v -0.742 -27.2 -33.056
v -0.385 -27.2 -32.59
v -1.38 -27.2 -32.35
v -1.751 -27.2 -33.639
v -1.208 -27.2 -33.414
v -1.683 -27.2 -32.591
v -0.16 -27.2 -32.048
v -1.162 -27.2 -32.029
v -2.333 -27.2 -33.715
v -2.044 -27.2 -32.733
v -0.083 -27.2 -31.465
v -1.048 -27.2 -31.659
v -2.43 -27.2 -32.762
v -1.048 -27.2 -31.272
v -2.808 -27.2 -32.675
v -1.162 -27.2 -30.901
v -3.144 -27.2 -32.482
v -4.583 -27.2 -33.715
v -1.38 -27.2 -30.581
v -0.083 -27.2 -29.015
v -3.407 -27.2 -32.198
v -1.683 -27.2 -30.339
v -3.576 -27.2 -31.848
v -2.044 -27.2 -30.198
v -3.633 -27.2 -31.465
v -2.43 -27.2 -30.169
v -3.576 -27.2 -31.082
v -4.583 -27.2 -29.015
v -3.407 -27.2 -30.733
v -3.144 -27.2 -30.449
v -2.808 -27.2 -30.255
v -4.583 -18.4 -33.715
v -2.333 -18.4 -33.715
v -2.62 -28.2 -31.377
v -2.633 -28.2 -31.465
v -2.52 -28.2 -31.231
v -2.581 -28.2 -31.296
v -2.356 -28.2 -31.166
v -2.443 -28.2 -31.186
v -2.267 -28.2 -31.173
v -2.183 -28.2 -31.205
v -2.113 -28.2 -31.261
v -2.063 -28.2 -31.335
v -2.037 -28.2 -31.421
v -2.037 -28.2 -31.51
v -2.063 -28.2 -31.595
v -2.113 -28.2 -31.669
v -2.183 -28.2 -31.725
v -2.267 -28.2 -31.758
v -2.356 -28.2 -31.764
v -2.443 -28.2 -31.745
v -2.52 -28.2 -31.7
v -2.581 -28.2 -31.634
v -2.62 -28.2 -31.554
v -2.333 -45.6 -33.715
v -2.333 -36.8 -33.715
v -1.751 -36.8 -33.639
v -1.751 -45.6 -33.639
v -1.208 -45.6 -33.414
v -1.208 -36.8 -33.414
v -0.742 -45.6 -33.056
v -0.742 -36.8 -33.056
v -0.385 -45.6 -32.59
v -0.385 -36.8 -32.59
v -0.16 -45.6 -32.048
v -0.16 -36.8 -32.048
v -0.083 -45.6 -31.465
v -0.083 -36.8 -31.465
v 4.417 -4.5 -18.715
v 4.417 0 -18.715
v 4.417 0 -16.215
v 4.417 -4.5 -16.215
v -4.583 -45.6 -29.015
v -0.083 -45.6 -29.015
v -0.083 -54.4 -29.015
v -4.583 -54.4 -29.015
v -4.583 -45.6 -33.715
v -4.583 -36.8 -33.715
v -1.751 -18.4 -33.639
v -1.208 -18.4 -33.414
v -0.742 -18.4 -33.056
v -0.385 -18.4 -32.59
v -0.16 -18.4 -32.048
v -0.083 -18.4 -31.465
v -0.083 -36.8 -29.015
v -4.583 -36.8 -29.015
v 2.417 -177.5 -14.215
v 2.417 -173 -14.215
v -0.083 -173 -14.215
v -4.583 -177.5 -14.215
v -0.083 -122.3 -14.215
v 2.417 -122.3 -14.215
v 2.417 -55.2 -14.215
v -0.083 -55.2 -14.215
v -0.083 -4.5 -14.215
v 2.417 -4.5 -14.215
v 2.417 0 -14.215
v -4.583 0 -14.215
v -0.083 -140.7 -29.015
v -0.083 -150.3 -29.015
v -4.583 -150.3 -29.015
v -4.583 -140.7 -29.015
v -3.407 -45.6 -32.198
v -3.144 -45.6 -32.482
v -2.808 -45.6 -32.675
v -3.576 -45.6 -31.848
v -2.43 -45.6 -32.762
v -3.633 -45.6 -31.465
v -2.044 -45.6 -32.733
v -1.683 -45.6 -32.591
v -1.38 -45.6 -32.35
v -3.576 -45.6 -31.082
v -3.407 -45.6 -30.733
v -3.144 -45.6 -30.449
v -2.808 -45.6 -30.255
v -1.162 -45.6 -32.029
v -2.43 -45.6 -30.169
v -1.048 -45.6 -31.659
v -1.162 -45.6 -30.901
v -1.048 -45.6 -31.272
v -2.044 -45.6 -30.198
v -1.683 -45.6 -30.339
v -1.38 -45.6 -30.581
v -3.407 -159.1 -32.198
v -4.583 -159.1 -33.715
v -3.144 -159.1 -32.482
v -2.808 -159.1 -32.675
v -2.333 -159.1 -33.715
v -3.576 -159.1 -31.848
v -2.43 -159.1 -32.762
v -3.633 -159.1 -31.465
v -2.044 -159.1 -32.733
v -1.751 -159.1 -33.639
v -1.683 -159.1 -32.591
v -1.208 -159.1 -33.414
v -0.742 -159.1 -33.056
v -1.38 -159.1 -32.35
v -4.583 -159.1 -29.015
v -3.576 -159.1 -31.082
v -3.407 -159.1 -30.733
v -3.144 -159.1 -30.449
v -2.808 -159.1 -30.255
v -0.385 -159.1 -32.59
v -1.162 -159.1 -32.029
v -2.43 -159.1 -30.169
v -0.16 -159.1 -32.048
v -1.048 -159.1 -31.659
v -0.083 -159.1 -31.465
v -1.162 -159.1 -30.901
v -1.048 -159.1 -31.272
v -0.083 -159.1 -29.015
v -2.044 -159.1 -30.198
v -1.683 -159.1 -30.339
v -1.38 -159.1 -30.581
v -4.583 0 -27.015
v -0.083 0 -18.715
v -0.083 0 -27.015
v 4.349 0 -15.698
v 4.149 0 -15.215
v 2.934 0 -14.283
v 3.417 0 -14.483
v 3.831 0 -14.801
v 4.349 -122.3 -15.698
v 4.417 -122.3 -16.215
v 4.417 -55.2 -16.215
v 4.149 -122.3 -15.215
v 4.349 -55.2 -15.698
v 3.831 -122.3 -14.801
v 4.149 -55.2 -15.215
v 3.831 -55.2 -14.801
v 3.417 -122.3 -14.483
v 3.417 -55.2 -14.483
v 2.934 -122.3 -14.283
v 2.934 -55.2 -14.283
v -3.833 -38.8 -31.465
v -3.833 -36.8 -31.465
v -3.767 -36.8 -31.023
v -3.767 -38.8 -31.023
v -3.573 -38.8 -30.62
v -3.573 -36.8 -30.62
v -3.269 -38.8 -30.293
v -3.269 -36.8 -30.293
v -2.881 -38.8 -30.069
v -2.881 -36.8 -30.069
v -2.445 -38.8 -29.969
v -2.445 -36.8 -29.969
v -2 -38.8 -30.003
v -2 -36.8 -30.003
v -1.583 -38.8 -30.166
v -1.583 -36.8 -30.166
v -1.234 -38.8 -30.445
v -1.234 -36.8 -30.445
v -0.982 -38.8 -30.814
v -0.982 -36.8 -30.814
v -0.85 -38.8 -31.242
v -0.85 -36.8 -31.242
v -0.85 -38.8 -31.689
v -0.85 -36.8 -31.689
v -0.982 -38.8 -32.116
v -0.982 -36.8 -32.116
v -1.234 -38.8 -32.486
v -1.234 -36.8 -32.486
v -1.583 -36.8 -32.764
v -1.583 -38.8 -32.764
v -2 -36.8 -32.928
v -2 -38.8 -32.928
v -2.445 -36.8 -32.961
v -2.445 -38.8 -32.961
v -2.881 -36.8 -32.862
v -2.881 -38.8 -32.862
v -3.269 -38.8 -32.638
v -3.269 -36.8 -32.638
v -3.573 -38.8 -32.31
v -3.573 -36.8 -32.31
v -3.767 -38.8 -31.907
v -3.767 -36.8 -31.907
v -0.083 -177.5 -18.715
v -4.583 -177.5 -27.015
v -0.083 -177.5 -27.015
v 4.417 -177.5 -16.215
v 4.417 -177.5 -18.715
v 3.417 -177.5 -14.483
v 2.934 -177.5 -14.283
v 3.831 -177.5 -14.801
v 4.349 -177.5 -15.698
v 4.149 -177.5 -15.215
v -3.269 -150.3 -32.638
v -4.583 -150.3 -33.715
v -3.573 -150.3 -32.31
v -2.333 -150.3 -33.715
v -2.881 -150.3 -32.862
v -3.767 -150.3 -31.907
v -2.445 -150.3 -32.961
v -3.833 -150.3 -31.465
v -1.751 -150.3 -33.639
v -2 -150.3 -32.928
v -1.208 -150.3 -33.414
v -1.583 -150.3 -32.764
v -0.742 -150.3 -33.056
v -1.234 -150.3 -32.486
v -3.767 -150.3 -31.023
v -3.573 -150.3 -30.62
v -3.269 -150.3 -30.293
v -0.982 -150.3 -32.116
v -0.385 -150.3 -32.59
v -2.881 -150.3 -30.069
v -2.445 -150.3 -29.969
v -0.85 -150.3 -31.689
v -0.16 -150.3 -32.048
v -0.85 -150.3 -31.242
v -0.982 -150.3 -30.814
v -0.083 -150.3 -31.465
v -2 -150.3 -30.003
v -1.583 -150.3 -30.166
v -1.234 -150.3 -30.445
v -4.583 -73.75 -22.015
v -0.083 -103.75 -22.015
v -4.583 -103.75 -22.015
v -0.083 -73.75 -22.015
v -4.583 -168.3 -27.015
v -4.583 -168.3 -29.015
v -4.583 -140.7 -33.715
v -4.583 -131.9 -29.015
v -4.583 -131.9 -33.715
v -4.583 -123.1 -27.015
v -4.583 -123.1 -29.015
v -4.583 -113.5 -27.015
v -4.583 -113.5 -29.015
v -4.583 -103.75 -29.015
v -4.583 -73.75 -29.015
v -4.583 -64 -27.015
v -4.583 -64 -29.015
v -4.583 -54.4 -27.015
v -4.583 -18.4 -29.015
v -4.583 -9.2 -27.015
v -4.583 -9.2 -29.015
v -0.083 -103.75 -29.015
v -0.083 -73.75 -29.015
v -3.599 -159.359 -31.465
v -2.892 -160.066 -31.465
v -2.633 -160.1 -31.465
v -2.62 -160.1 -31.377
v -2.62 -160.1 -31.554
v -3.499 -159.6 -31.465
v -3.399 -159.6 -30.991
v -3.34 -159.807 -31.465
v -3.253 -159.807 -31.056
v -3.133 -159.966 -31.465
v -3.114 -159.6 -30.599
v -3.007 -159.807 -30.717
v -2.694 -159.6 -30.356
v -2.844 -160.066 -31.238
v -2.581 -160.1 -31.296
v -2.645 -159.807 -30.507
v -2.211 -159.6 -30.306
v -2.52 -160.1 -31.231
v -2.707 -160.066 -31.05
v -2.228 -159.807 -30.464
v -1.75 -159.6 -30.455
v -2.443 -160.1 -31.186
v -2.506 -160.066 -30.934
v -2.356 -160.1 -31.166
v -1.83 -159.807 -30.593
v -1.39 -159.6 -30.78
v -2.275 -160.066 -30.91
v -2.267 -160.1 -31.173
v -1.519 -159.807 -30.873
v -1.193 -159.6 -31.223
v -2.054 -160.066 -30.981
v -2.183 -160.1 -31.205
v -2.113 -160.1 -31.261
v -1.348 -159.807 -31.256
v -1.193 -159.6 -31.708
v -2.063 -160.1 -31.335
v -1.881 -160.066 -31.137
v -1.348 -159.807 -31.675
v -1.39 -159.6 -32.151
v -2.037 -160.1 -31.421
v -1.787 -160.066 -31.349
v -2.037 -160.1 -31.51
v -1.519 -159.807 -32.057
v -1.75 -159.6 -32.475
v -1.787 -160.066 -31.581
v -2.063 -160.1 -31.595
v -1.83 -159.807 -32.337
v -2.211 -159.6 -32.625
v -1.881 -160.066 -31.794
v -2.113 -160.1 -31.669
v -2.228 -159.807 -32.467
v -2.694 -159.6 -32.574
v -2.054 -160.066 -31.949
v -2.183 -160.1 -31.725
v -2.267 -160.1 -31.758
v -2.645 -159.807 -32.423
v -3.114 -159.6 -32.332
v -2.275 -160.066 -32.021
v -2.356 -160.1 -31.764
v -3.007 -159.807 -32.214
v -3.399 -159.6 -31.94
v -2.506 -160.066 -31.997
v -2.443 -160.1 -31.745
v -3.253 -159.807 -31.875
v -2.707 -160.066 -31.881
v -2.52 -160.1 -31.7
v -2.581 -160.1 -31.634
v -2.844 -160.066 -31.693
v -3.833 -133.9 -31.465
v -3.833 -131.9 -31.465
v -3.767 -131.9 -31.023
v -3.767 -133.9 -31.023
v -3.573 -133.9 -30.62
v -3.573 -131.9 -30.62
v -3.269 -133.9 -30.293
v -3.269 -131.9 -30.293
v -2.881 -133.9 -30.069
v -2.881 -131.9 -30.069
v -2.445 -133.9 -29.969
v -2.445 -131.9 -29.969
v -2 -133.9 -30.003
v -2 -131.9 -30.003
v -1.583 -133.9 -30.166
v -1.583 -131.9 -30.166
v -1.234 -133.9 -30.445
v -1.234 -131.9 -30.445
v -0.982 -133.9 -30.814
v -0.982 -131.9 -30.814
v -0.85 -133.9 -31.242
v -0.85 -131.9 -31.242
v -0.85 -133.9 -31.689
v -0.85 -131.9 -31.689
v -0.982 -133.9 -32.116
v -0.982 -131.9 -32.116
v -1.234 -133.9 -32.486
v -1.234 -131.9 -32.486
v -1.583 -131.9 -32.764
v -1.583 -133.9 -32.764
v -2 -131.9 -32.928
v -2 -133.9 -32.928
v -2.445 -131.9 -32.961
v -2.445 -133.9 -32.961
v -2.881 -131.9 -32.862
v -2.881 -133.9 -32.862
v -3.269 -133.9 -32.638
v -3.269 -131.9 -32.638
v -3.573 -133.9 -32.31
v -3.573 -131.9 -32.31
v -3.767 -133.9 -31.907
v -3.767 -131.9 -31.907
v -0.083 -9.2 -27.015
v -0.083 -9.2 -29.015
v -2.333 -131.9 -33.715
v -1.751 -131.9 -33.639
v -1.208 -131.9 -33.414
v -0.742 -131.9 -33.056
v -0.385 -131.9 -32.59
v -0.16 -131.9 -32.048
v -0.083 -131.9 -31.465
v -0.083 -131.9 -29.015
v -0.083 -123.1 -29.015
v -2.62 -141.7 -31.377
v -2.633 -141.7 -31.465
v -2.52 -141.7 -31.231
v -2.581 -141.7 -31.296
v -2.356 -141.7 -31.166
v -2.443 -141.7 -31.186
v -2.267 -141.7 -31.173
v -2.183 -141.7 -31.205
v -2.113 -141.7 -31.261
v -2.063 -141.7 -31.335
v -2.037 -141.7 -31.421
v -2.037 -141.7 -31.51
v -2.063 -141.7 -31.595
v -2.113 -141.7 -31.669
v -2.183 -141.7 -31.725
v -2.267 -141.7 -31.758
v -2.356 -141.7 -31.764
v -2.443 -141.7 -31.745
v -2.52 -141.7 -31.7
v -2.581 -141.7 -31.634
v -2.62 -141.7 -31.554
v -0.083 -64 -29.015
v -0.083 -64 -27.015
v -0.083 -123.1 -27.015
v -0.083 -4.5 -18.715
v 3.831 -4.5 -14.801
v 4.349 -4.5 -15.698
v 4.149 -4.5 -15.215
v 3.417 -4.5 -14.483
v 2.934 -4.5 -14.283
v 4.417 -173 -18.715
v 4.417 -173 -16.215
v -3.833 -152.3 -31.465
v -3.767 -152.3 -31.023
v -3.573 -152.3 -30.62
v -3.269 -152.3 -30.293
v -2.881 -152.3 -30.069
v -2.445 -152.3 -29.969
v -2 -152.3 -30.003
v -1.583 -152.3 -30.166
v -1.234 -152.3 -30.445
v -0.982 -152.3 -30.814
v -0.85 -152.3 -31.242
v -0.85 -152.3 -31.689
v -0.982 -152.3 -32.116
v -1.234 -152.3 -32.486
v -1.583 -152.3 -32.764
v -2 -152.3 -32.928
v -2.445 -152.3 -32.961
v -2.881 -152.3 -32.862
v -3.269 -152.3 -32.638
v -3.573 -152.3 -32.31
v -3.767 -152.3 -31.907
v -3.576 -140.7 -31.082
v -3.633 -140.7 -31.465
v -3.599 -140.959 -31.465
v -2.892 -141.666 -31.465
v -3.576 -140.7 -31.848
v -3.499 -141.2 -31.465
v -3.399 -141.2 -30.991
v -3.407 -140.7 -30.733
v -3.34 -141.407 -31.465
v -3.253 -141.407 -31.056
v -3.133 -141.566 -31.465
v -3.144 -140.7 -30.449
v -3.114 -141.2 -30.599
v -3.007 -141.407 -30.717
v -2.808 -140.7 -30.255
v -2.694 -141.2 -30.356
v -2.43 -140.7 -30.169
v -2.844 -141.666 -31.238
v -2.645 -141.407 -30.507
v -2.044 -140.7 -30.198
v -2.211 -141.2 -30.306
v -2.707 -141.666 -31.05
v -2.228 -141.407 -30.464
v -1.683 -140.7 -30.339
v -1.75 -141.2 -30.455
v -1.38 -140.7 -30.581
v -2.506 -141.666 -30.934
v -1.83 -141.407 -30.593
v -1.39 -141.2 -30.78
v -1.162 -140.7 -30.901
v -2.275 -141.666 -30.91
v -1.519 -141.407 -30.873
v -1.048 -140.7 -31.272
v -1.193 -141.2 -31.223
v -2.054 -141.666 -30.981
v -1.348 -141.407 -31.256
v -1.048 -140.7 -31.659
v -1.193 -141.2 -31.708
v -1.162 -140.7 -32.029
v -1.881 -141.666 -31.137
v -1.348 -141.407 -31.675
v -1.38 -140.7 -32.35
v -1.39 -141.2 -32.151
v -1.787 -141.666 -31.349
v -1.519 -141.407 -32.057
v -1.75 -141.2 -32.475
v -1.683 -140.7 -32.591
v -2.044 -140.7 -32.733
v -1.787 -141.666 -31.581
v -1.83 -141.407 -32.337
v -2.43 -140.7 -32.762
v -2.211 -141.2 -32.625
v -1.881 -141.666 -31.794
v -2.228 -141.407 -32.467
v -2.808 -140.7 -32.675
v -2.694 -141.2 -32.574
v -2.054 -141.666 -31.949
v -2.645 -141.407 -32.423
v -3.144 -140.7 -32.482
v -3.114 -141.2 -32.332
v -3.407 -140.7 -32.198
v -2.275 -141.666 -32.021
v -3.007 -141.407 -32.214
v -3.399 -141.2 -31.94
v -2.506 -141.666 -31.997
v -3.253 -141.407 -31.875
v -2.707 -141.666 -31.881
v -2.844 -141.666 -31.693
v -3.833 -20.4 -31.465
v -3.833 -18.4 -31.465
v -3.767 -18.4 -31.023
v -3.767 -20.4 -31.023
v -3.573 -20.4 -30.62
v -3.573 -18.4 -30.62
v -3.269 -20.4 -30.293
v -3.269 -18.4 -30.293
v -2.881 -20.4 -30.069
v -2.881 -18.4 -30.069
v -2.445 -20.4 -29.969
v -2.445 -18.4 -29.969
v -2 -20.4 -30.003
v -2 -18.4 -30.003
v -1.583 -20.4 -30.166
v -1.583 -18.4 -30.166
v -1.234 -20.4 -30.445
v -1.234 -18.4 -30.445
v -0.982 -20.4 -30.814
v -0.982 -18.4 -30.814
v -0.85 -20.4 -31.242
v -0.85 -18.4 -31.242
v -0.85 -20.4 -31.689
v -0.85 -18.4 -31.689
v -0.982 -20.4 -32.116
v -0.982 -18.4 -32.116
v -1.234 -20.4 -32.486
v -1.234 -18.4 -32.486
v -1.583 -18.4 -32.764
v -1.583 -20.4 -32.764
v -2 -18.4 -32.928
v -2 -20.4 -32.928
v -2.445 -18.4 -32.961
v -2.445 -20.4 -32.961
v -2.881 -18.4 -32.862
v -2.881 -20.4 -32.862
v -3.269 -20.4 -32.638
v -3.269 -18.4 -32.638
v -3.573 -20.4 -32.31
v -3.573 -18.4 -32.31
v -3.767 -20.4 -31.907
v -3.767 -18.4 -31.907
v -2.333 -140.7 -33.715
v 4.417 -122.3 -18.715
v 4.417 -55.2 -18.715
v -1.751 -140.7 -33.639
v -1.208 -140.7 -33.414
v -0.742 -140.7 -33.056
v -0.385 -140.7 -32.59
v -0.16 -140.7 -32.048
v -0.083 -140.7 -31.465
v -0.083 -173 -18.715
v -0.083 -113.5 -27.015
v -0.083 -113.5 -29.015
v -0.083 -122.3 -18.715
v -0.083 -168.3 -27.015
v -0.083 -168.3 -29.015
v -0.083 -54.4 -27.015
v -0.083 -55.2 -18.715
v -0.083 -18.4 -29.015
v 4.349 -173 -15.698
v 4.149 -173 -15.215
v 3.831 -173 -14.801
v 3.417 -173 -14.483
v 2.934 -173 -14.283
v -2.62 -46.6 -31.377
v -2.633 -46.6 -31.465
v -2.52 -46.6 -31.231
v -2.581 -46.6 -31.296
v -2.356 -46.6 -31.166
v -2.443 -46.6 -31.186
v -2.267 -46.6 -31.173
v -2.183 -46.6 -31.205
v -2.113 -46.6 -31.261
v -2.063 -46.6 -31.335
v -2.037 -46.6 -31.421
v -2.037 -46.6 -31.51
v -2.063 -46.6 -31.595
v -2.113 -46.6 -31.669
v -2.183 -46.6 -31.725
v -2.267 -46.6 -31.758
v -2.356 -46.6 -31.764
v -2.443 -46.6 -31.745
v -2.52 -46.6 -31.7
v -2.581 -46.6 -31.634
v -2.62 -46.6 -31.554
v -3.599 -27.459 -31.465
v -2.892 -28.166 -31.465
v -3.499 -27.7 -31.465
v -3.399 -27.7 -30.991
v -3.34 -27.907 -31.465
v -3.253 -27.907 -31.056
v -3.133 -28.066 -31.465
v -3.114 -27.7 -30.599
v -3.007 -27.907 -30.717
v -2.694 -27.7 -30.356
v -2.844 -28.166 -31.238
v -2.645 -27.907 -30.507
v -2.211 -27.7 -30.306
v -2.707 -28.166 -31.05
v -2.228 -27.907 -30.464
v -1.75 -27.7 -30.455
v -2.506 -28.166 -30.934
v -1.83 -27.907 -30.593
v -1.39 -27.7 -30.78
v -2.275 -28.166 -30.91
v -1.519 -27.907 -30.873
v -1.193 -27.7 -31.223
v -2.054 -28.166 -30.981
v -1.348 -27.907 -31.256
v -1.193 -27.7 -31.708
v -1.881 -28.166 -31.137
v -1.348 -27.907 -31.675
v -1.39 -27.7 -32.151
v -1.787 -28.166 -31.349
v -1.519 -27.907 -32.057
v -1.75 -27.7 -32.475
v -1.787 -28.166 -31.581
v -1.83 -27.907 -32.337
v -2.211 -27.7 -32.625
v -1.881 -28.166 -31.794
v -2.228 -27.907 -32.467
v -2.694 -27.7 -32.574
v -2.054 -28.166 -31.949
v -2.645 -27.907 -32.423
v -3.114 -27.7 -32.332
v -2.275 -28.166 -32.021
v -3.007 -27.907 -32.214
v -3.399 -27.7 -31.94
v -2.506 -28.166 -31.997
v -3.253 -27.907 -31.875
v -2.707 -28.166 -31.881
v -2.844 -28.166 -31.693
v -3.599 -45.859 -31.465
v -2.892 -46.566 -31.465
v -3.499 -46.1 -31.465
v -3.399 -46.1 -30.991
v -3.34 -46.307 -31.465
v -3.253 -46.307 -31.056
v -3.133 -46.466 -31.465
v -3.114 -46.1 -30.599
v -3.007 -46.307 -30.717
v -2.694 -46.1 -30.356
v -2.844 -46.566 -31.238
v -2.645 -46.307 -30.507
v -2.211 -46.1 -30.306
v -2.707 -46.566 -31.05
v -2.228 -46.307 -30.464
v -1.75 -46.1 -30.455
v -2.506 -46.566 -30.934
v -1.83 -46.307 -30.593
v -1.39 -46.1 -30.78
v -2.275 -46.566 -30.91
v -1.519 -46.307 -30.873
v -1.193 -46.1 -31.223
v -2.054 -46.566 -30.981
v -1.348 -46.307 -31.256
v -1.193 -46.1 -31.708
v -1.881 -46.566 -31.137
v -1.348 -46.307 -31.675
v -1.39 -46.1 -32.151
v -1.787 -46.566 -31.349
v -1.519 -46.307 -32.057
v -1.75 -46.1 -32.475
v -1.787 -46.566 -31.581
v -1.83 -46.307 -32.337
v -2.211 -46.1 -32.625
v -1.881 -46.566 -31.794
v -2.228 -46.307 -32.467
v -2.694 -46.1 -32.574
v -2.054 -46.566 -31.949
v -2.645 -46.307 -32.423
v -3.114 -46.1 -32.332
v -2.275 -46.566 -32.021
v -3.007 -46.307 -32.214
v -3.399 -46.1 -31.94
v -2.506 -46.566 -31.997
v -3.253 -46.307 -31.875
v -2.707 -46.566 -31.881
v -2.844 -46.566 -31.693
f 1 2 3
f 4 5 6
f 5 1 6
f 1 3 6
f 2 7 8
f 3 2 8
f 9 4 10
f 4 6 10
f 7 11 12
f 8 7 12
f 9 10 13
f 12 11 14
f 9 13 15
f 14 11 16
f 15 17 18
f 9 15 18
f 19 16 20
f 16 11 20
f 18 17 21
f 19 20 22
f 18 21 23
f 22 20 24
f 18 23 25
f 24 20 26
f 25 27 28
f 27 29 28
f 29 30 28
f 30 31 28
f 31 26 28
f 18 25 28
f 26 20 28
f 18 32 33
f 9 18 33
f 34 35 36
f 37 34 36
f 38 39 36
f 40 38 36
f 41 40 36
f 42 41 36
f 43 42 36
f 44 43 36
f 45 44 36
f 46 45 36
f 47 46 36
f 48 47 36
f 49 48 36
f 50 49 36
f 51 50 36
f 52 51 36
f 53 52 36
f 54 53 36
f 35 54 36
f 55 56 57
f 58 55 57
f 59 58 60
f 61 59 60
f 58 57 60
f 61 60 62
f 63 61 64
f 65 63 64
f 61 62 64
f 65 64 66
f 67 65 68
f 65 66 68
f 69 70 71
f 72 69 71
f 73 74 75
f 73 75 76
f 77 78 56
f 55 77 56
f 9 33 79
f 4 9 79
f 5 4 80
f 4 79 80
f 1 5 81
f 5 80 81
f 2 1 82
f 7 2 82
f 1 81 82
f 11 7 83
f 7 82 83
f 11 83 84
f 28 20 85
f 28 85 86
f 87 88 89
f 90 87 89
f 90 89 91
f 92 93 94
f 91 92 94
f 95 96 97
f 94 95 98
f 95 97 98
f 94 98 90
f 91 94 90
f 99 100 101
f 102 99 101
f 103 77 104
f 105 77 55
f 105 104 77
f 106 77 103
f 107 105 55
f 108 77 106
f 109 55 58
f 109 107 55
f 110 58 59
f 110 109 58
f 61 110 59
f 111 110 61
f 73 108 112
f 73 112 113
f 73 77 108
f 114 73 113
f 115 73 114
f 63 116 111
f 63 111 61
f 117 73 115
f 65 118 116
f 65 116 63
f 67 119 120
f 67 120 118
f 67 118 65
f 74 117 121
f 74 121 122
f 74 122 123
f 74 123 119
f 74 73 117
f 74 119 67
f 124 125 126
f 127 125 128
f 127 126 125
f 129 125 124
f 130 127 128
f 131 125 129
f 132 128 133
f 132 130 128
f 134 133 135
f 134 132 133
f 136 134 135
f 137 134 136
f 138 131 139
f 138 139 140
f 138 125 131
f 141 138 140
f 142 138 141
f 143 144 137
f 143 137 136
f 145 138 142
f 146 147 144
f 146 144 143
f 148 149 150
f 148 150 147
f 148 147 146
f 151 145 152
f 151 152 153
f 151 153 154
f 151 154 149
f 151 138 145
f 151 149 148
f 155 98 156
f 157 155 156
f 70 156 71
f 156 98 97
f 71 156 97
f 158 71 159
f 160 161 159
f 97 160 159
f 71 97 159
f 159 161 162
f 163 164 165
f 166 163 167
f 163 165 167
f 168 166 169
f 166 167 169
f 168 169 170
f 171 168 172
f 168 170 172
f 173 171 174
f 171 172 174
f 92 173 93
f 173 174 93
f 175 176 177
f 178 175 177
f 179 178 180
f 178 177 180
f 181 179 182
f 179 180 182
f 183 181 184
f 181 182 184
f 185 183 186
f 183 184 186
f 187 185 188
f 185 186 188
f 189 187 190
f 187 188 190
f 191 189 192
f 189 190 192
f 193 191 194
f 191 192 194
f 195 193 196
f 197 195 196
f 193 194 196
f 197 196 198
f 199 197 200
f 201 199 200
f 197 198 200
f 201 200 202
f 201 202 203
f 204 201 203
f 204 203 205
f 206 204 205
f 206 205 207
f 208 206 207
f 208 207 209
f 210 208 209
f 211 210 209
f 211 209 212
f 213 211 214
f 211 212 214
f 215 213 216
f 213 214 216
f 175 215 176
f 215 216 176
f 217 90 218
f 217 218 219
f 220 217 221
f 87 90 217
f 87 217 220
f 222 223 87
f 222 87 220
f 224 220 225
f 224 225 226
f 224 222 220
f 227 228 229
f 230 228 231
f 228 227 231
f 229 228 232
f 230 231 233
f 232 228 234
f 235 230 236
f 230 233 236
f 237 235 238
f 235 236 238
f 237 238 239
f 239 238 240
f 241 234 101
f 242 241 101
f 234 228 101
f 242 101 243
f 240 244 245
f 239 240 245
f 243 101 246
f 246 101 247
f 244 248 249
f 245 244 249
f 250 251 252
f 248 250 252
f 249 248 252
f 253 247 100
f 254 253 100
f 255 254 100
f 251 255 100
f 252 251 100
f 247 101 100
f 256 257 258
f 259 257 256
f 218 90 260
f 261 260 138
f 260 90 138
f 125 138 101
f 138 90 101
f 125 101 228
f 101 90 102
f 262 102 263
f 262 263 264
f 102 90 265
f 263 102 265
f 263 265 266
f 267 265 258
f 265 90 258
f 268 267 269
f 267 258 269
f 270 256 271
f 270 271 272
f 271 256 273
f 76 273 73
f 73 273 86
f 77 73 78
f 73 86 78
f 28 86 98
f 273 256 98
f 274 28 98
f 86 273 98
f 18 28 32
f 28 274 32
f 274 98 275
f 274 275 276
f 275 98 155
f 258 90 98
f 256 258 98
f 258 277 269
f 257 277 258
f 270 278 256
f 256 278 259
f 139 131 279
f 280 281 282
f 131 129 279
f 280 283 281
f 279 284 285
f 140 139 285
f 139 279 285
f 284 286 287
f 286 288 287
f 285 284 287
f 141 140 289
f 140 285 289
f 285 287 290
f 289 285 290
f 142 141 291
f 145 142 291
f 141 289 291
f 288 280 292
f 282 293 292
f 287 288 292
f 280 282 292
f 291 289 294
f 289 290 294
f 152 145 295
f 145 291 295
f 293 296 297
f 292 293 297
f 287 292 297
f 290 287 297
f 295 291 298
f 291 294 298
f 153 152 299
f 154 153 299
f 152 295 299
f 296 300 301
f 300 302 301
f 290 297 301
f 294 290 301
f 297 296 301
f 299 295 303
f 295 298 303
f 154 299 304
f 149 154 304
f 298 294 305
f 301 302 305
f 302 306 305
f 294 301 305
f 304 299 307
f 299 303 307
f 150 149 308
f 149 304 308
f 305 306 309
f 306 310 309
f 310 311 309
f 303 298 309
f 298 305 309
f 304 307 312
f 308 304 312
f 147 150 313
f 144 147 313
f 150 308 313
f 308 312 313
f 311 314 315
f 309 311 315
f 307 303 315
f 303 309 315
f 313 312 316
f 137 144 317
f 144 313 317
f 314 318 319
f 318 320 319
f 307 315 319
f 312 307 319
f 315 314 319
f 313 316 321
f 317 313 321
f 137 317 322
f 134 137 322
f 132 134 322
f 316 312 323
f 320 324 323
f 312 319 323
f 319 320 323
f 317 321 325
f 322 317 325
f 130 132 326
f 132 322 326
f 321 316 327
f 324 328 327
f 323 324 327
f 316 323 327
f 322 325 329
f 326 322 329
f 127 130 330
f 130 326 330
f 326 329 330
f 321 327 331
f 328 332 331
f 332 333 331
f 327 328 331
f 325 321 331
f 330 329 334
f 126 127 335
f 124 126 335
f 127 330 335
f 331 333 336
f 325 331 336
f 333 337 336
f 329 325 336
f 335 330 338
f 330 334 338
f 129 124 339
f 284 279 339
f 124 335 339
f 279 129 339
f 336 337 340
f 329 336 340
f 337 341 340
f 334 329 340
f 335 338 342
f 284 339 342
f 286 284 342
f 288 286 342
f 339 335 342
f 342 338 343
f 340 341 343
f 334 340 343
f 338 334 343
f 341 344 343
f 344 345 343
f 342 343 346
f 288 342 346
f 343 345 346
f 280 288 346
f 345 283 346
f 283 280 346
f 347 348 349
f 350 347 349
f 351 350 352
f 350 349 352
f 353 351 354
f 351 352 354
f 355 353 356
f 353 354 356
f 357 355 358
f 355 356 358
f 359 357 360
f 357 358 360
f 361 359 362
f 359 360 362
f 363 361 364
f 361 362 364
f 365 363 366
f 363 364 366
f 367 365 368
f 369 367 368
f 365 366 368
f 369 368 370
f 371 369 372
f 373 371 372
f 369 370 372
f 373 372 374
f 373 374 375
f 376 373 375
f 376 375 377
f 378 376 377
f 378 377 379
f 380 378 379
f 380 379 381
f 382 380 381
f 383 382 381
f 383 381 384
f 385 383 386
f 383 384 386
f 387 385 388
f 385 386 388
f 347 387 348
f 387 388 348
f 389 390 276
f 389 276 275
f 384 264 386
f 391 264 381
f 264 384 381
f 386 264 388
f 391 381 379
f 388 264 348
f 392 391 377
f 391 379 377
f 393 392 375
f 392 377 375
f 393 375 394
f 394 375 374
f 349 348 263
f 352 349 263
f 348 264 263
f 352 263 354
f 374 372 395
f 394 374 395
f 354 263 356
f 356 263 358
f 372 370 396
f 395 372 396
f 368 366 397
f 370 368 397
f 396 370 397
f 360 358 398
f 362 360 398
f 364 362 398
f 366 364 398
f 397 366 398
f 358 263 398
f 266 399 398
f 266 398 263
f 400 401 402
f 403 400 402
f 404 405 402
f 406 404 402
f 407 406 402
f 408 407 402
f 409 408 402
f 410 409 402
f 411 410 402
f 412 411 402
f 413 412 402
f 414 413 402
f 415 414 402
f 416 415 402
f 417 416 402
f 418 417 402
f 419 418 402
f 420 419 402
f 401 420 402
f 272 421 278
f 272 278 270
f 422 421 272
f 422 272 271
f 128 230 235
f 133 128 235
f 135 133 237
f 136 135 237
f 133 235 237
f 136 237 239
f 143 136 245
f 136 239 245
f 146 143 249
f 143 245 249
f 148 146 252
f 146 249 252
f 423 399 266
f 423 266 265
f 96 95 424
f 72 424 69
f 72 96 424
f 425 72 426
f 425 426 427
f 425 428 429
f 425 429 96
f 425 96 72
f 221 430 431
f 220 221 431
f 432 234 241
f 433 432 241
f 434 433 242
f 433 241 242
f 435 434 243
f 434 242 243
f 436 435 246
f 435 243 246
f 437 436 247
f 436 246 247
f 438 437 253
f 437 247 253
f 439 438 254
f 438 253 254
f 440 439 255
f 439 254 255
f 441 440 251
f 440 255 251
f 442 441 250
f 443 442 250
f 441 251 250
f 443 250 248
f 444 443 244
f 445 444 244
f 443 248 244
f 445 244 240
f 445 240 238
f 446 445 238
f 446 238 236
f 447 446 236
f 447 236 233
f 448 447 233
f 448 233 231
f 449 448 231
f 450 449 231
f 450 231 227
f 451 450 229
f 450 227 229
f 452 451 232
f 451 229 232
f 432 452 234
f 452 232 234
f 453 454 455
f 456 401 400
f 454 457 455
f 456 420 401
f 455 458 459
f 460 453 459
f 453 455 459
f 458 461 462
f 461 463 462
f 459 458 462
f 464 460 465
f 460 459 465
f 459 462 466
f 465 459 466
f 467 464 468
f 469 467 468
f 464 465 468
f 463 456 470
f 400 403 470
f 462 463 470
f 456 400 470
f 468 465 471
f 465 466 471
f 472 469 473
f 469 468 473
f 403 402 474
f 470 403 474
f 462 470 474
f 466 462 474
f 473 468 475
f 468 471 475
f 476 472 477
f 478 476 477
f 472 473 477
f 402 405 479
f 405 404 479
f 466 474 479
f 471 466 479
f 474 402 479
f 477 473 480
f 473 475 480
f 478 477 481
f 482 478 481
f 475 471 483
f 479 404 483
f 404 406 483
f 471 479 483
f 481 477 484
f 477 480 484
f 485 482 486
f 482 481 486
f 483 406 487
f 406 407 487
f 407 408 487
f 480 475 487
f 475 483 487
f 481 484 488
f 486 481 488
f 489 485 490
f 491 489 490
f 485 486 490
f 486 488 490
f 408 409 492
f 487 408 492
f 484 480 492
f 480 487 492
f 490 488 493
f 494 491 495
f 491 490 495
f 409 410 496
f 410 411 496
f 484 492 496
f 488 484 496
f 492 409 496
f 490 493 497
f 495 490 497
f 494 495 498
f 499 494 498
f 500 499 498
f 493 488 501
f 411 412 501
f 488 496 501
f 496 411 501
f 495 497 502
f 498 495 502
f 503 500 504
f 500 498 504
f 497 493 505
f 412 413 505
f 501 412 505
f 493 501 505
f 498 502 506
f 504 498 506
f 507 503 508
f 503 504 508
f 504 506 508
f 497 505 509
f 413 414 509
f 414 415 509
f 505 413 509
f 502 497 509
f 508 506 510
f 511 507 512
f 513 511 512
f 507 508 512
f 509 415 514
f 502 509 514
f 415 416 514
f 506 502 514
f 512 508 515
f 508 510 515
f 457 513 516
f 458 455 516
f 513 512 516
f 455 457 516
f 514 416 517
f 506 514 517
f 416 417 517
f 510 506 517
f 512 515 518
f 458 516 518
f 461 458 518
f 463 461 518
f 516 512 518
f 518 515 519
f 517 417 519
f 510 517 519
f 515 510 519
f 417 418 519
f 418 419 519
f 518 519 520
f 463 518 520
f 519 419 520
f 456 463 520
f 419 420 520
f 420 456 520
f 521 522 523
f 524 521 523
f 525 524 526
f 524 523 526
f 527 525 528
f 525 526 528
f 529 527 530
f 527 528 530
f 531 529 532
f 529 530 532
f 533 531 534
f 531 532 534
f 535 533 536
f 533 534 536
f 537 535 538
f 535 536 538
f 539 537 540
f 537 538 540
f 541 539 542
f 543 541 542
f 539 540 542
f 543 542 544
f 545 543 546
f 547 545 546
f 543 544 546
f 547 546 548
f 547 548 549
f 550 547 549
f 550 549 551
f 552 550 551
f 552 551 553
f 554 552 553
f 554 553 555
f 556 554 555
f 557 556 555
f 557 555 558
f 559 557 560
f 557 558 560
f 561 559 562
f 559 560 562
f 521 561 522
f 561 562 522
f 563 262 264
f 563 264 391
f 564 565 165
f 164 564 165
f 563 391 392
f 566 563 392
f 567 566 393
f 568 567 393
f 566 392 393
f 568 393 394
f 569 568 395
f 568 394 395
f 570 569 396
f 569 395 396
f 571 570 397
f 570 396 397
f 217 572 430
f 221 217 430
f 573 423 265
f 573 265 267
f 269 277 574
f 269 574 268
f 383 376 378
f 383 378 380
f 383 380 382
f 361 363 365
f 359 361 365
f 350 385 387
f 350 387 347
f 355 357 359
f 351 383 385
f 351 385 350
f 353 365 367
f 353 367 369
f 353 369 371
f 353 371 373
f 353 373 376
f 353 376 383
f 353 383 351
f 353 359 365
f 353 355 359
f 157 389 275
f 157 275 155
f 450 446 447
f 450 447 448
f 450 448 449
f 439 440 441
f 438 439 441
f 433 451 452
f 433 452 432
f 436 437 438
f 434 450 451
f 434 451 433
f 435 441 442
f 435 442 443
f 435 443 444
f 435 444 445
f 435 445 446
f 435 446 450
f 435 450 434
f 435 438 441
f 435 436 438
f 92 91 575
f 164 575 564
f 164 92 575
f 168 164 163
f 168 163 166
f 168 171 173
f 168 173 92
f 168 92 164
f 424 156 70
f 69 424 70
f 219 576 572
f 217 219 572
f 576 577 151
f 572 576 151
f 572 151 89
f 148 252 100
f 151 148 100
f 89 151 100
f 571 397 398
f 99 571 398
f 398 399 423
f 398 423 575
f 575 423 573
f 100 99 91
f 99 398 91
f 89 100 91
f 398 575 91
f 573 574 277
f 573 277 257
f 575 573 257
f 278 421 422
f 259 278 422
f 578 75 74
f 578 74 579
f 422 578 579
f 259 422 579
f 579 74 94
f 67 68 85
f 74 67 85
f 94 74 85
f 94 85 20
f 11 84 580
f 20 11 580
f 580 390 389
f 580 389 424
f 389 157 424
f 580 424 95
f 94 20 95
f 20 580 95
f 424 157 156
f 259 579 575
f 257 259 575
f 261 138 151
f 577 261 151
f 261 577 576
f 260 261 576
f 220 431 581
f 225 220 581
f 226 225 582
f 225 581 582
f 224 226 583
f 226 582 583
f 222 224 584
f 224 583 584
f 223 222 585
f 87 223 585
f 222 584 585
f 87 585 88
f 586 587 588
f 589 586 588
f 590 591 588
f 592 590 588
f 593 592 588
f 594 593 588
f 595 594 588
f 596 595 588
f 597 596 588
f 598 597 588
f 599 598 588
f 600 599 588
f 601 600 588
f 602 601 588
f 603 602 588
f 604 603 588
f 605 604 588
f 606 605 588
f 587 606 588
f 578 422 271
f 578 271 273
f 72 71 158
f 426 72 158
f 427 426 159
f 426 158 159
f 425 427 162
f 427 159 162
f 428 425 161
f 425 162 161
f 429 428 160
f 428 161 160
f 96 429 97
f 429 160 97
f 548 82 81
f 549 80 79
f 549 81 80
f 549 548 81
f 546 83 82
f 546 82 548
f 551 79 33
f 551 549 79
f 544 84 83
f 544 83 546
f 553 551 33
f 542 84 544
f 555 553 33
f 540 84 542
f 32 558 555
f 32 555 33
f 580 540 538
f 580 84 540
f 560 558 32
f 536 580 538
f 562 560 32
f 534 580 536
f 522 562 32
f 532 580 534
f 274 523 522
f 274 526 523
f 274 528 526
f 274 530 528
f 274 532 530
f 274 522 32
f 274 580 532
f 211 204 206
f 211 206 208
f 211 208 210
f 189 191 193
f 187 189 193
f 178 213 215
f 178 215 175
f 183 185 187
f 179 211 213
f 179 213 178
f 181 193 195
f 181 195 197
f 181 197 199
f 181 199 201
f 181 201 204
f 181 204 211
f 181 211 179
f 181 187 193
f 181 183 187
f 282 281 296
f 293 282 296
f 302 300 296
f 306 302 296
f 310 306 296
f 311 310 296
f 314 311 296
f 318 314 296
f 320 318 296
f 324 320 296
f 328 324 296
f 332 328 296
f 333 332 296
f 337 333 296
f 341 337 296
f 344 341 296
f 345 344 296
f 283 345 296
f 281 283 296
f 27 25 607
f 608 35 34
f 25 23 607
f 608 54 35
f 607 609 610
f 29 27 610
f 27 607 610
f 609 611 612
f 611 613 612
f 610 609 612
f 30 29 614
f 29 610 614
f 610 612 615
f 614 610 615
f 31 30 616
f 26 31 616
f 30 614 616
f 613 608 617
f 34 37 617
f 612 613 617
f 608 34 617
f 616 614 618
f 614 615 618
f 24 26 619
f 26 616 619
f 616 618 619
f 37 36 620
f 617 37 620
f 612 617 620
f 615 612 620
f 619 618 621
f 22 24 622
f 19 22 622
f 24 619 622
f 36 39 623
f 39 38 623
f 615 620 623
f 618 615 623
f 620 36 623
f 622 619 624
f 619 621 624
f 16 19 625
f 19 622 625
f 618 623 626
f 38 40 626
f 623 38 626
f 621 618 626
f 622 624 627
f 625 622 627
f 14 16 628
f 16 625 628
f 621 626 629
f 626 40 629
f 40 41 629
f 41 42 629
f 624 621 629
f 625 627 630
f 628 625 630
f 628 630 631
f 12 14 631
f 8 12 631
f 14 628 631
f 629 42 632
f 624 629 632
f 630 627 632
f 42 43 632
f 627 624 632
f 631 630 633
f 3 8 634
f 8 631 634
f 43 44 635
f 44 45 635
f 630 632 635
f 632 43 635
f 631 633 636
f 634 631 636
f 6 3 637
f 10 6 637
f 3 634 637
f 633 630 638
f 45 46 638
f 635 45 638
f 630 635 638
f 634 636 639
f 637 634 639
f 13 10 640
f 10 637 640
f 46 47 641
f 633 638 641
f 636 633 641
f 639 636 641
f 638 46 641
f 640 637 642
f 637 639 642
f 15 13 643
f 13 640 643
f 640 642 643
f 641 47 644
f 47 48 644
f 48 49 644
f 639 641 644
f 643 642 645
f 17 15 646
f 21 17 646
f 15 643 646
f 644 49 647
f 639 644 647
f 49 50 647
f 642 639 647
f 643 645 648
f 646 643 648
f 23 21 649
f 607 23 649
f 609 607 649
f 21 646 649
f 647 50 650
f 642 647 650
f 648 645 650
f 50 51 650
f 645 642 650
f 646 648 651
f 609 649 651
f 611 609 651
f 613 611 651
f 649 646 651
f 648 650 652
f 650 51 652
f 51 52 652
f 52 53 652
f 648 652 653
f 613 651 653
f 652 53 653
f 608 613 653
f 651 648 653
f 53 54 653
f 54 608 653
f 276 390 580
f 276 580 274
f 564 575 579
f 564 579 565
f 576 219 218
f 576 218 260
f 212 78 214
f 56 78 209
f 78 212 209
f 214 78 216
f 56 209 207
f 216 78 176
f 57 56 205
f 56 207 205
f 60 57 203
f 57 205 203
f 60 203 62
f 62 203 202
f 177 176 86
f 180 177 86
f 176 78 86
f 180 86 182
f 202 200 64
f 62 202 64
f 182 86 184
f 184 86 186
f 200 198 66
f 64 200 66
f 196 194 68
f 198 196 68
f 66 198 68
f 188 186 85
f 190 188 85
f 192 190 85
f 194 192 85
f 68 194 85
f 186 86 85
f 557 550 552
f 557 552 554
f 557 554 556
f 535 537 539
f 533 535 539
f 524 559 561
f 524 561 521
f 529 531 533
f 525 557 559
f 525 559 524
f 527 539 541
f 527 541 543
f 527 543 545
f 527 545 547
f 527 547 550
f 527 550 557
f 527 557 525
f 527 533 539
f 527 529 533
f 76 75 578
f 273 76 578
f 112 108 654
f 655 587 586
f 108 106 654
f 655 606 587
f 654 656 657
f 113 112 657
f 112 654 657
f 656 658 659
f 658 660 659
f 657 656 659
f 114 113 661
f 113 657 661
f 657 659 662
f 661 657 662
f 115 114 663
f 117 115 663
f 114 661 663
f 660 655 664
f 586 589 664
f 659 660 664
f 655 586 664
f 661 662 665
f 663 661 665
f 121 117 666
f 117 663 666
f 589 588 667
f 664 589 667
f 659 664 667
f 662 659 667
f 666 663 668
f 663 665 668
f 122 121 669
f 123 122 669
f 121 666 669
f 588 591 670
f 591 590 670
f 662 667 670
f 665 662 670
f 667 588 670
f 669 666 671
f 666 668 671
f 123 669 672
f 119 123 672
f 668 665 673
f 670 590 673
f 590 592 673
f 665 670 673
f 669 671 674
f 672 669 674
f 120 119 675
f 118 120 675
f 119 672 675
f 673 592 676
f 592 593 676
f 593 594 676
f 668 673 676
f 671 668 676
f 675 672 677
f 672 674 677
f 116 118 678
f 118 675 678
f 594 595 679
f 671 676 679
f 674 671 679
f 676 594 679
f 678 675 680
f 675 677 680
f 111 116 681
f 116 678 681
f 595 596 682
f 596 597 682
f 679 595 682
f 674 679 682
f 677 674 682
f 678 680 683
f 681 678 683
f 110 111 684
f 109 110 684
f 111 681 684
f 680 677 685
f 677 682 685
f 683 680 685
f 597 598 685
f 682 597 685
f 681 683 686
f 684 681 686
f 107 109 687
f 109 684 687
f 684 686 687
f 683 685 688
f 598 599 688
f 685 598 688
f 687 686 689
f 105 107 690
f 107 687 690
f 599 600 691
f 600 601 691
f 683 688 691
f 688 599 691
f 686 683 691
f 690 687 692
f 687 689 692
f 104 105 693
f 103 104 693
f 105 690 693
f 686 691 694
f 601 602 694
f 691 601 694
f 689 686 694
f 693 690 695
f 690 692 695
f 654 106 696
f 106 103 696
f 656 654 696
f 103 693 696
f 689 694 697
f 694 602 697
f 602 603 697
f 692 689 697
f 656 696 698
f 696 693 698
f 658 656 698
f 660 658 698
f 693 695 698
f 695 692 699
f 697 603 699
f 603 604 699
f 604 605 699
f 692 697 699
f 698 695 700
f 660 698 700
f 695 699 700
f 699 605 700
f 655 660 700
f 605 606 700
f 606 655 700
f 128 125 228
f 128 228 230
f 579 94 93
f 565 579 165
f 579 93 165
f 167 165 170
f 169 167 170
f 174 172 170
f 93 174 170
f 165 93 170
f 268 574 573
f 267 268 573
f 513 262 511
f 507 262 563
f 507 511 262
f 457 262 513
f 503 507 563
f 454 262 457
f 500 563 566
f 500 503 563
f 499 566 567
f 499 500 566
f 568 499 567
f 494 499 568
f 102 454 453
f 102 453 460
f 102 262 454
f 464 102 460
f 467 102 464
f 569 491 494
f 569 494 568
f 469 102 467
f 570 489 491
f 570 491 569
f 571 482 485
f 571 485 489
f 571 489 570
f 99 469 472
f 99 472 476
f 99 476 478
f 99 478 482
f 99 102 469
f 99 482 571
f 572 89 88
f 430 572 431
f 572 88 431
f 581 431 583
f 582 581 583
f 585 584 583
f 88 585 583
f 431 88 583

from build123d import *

# Parameters (mm, degrees)
F0_R      = 1.5
F1_DEPTH  = 159.1
F2_DEPTH  = 150.3
F3_DEPTH  = 177.5
F4_DEPTH  = 140.7
F5_DEPTH  = 131.9
F6_DEPTH  = 45.6
F7_DEPTH  = 36.8
F8_DEPTH  = 27.2
F9_DEPTH  = 18.4
F10_DEPTH = 173
F11_DEPTH = 122.3
F12_DEPTH = 55.2
F13_DEPTH = 4.5
F14_W     = 30
F14_H     = 7
F14_W_2   = 9.6
F14_H_2   = 2
F14_W_3   = 9.2
F15_DEPTH = 25
F16_R     = 1.5
F16_R_2   = 1.3
F17_R     = 1.5
F17_R_2   = 1.3
F18_R     = 1.5
F18_R_2   = 1.3
F19_R     = 1.5
F19_R_2   = 1.3
F20_DEPTH = 8.8
F21_DEPTH = 9.8
F22_DEPTH = 2
F23_R     = 0.99999


# Not quite as in the source:
# - a fillet or chamfer is up to 0.001 mm smaller than in the source, because OpenCascade refuses the exact size
# - a feature names something its author has since deleted; it is built from what else it names


with BuildPart() as f1:
    # F0 (on Front) → F1 (new body)
    with BuildSketch(Plane.XZ):
        with BuildLine():
            Line((-0.0833333333, -31.4652777778), (-0.0833333333, -29.0152777778))
            Line((-0.0833333333, -29.0152777778), (-4.5833333333, -29.0152777778))
            Line((-4.5833333333, -29.0152777778), (-4.5833333333, -31.4652777778))
            Line((-4.5833333333, -31.4652777778), (-4.5833333333, -33.7152777778))
            Line((-4.5833333333, -33.7152777778), (-2.3333333333, -33.7152777778))
            ThreePointArc((-2.3333333333, -33.7152777778), (-0.7423430757, -33.0562680354), (-0.0833333333, -31.4652777778))
        make_face()
        with Locations((-2.3333333333, -31.4652777778)):
            Circle(F0_R, mode=Mode.SUBTRACT)
        Polygon((-0.0833333333, -29.0152777778), (-0.0833333333, -18.7152777778), (-0.0833333333, -14.2152777778), (-4.5833333333, -14.2152777778), (-4.5833333333, -29.0152777778), align=None)
    extrude(amount=F1_DEPTH)

    # F0 (on Front) → F2 (cut)
    with BuildSketch(Plane.XZ):
        with BuildLine():
            Line((-0.0833333333, -14.2152777778), (-0.0833333333, -18.7152777778))
            Line((-0.0833333333, -18.7152777778), (4.4166666667, -18.7152777778))
            Line((4.4166666667, -18.7152777778), (4.4166666667, -16.2152777778))
            ThreePointArc((4.4166666667, -16.2152777778), (3.830880229, -14.8010642154), (2.4166666667, -14.2152777778))
            Line((2.4166666667, -14.2152777778), (-0.0833333333, -14.2152777778))
        make_face()
        with BuildLine():
            Line((-0.0833333333, -31.4652777778), (-0.0833333333, -29.0152777778))
            Line((-0.0833333333, -29.0152777778), (-4.5833333333, -29.0152777778))
            Line((-4.5833333333, -29.0152777778), (-4.5833333333, -31.4652777778))
            Line((-4.5833333333, -31.4652777778), (-4.5833333333, -33.7152777778))
            Line((-4.5833333333, -33.7152777778), (-2.3333333333, -33.7152777778))
            ThreePointArc((-2.3333333333, -33.7152777778), (-0.7423430757, -33.0562680354), (-0.0833333333, -31.4652777778))
        make_face()
        with Locations((-2.3333333333, -31.4652777778)):
            Circle(F0_R, mode=Mode.SUBTRACT)
    extrude(amount=F2_DEPTH, mode=Mode.SUBTRACT)

    # F0 (on Front) → F3 (join)
    with BuildSketch(Plane.XZ):
        with BuildLine():
            Line((-0.0833333333, -14.2152777778), (-0.0833333333, -18.7152777778))
            Line((-0.0833333333, -18.7152777778), (4.4166666667, -18.7152777778))
            Line((4.4166666667, -18.7152777778), (4.4166666667, -16.2152777778))
            ThreePointArc((4.4166666667, -16.2152777778), (3.830880229, -14.8010642154), (2.4166666667, -14.2152777778))
            Line((2.4166666667, -14.2152777778), (-0.0833333333, -14.2152777778))
        make_face()
        Polygon((-0.0833333333, -29.0152777778), (-0.0833333333, -18.7152777778), (-0.0833333333, -14.2152777778), (-4.5833333333, -14.2152777778), (-4.5833333333, -29.0152777778), align=None)
    extrude(amount=F3_DEPTH)

    # F0 (on Front) → F4 (join)
    with BuildSketch(Plane.XZ):
        with BuildLine():
            Line((-0.0833333333, -31.4652777778), (-0.0833333333, -29.0152777778))
            Line((-0.0833333333, -29.0152777778), (-4.5833333333, -29.0152777778))
            Line((-4.5833333333, -29.0152777778), (-4.5833333333, -31.4652777778))
            Line((-4.5833333333, -31.4652777778), (-4.5833333333, -33.7152777778))
            Line((-4.5833333333, -33.7152777778), (-2.3333333333, -33.7152777778))
            ThreePointArc((-2.3333333333, -33.7152777778), (-0.7423430757, -33.0562680354), (-0.0833333333, -31.4652777778))
        make_face()
        with Locations((-2.3333333333, -31.4652777778)):
            Circle(F0_R, mode=Mode.SUBTRACT)
    extrude(amount=F4_DEPTH)

    # F0 (on Front) → F5 (cut)
    with BuildSketch(Plane.XZ):
        with BuildLine():
            Line((-0.0833333333, -31.4652777778), (-0.0833333333, -29.0152777778))
            Line((-0.0833333333, -29.0152777778), (-4.5833333333, -29.0152777778))
            Line((-4.5833333333, -29.0152777778), (-4.5833333333, -31.4652777778))
            Line((-4.5833333333, -31.4652777778), (-4.5833333333, -33.7152777778))
            Line((-4.5833333333, -33.7152777778), (-2.3333333333, -33.7152777778))
            ThreePointArc((-2.3333333333, -33.7152777778), (-0.7423430757, -33.0562680354), (-0.0833333333, -31.4652777778))
        make_face()
        with Locations((-2.3333333333, -31.4652777778)):
            Circle(F0_R, mode=Mode.SUBTRACT)
    extrude(amount=F5_DEPTH, mode=Mode.SUBTRACT)

    # F0 (on Front) → F6 (join)
    with BuildSketch(Plane.XZ):
        with BuildLine():
            Line((-0.0833333333, -31.4652777778), (-0.0833333333, -29.0152777778))
            Line((-0.0833333333, -29.0152777778), (-4.5833333333, -29.0152777778))
            Line((-4.5833333333, -29.0152777778), (-4.5833333333, -31.4652777778))
            Line((-4.5833333333, -31.4652777778), (-4.5833333333, -33.7152777778))
            Line((-4.5833333333, -33.7152777778), (-2.3333333333, -33.7152777778))
            ThreePointArc((-2.3333333333, -33.7152777778), (-0.7423430757, -33.0562680354), (-0.0833333333, -31.4652777778))
        make_face()
        with Locations((-2.3333333333, -31.4652777778)):
            Circle(F0_R, mode=Mode.SUBTRACT)
    extrude(amount=F6_DEPTH)

    # F0 (on Front) → F7 (cut)
    with BuildSketch(Plane.XZ):
        with BuildLine():
            Line((-0.0833333333, -31.4652777778), (-0.0833333333, -29.0152777778))
            Line((-0.0833333333, -29.0152777778), (-4.5833333333, -29.0152777778))
            Line((-4.5833333333, -29.0152777778), (-4.5833333333, -31.4652777778))
            Line((-4.5833333333, -31.4652777778), (-4.5833333333, -33.7152777778))
            Line((-4.5833333333, -33.7152777778), (-2.3333333333, -33.7152777778))
            ThreePointArc((-2.3333333333, -33.7152777778), (-0.7423430757, -33.0562680354), (-0.0833333333, -31.4652777778))
        make_face()
        with Locations((-2.3333333333, -31.4652777778)):
            Circle(F0_R, mode=Mode.SUBTRACT)
    extrude(amount=F7_DEPTH, mode=Mode.SUBTRACT)

    # F0 (on Front) → F8 (join)
    with BuildSketch(Plane.XZ):
        with BuildLine():
            Line((-0.0833333333, -31.4652777778), (-0.0833333333, -29.0152777778))
            Line((-0.0833333333, -29.0152777778), (-4.5833333333, -29.0152777778))
            Line((-4.5833333333, -29.0152777778), (-4.5833333333, -31.4652777778))
            Line((-4.5833333333, -31.4652777778), (-4.5833333333, -33.7152777778))
            Line((-4.5833333333, -33.7152777778), (-2.3333333333, -33.7152777778))
            ThreePointArc((-2.3333333333, -33.7152777778), (-0.7423430757, -33.0562680354), (-0.0833333333, -31.4652777778))
        make_face()
        with Locations((-2.3333333333, -31.4652777778)):
            Circle(F0_R, mode=Mode.SUBTRACT)
    extrude(amount=F8_DEPTH)

    # F0 (on Front) → F9 (cut)
    with BuildSketch(Plane.XZ):
        with BuildLine():
            Line((-0.0833333333, -31.4652777778), (-0.0833333333, -29.0152777778))
            Line((-0.0833333333, -29.0152777778), (-4.5833333333, -29.0152777778))
            Line((-4.5833333333, -29.0152777778), (-4.5833333333, -31.4652777778))
            Line((-4.5833333333, -31.4652777778), (-4.5833333333, -33.7152777778))
            Line((-4.5833333333, -33.7152777778), (-2.3333333333, -33.7152777778))
            ThreePointArc((-2.3333333333, -33.7152777778), (-0.7423430757, -33.0562680354), (-0.0833333333, -31.4652777778))
        make_face()
        with Locations((-2.3333333333, -31.4652777778)):
            Circle(F0_R, mode=Mode.SUBTRACT)
    extrude(amount=F9_DEPTH, mode=Mode.SUBTRACT)

    # F0 (on Front) → F10 (cut)
    with BuildSketch(Plane.XZ):
        with BuildLine():
            Line((-0.0833333333, -14.2152777778), (-0.0833333333, -18.7152777778))
            Line((-0.0833333333, -18.7152777778), (4.4166666667, -18.7152777778))
            Line((4.4166666667, -18.7152777778), (4.4166666667, -16.2152777778))
            ThreePointArc((4.4166666667, -16.2152777778), (3.830880229, -14.8010642154), (2.4166666667, -14.2152777778))
            Line((2.4166666667, -14.2152777778), (-0.0833333333, -14.2152777778))
        make_face()
    extrude(amount=F10_DEPTH, mode=Mode.SUBTRACT)

    # F0 (on Front) → F11 (join)
    with BuildSketch(Plane.XZ):
        with BuildLine():
            Line((-0.0833333333, -14.2152777778), (-0.0833333333, -18.7152777778))
            Line((-0.0833333333, -18.7152777778), (4.4166666667, -18.7152777778))
            Line((4.4166666667, -18.7152777778), (4.4166666667, -16.2152777778))
            ThreePointArc((4.4166666667, -16.2152777778), (3.830880229, -14.8010642154), (2.4166666667, -14.2152777778))
            Line((2.4166666667, -14.2152777778), (-0.0833333333, -14.2152777778))
        make_face()
    extrude(amount=F11_DEPTH)

    # F0 (on Front) → F12 (cut)
    with BuildSketch(Plane.XZ):
        with BuildLine():
            Line((-0.0833333333, -14.2152777778), (-0.0833333333, -18.7152777778))
            Line((-0.0833333333, -18.7152777778), (4.4166666667, -18.7152777778))
            Line((4.4166666667, -18.7152777778), (4.4166666667, -16.2152777778))
            ThreePointArc((4.4166666667, -16.2152777778), (3.830880229, -14.8010642154), (2.4166666667, -14.2152777778))
            Line((2.4166666667, -14.2152777778), (-0.0833333333, -14.2152777778))
        make_face()
    extrude(amount=F12_DEPTH, mode=Mode.SUBTRACT)

    # F0 (on Front) → F13 (join)
    with BuildSketch(Plane.XZ):
        with BuildLine():
            Line((-0.0833333333, -14.2152777778), (-0.0833333333, -18.7152777778))
            Line((-0.0833333333, -18.7152777778), (4.4166666667, -18.7152777778))
            Line((4.4166666667, -18.7152777778), (4.4166666667, -16.2152777778))
            ThreePointArc((4.4166666667, -16.2152777778), (3.830880229, -14.8010642154), (2.4166666667, -14.2152777778))
            Line((2.4166666667, -14.2152777778), (-0.0833333333, -14.2152777778))
        make_face()
    extrude(amount=F13_DEPTH)

    # F14 (on face) → F15 (cut)
    with BuildSketch(Plane.YZ.offset(-0.0833333333)):
        with Locations((-88.75, -25.5152777778)):
            Rectangle(F14_W, F14_H)
        with Locations((-59.2, -28.0152777778)):
            Rectangle(F14_W_2, F14_H_2)
        with Locations((-4.6, -28.0152777778)):
            Rectangle(F14_W_3, F14_H_2)
        with Locations((-118.3, -28.0152777778)):
            Rectangle(F14_W_2, F14_H_2)
        with Locations((-172.9, -28.0152777778)):
            Rectangle(F14_W_3, F14_H_2)
    extrude(amount=-F15_DEPTH, mode=Mode.SUBTRACT)

    # F16 (on face) + F17 (on face) + F18 (on face) + F19 (on face) → F20 (join)
    with BuildSketch(Plane(origin=(0, -18.4, 0), x_dir=(-1, 0, 0), z_dir=(0, 1, 0))):
        with Locations((2.3333333333, -31.4652777778)):
            Circle(F16_R)
        with Locations((2.3333333333, -31.4652777778)):
            Circle(F16_R_2, mode=Mode.SUBTRACT)
    with BuildSketch(Plane(origin=(0, -36.8, 0), x_dir=(-1, 0, 0), z_dir=(0, 1, 0))):
        with Locations((2.3333333333, -31.4652777778)):
            Circle(F17_R)
        with Locations((2.3333333333, -31.4652777778)):
            Circle(F17_R_2, mode=Mode.SUBTRACT)
    with BuildSketch(Plane(origin=(0, -131.9, 0), x_dir=(-1, 0, 0), z_dir=(0, 1, 0))):
        with Locations((2.3333333333, -31.4652777778)):
            Circle(F18_R)
        with Locations((2.3333333333, -31.4652777778)):
            Circle(F18_R_2, mode=Mode.SUBTRACT)
    with BuildSketch(Plane(origin=(0, -150.3, 0), x_dir=(-1, 0, 0), z_dir=(0, 1, 0))):
        with Locations((2.3333333333, -31.4652777778)):
            Circle(F19_R)
        with Locations((2.3333333333, -31.4652777778)):
            Circle(F19_R_2, mode=Mode.SUBTRACT)
    extrude(amount=-F20_DEPTH)

    # F16 (on face) + F17 (on face) + F18 (on face) + F19 (on face) → F21 (join)
    with BuildSketch(Plane(origin=(0, -18.4, 0), x_dir=(-1, 0, 0), z_dir=(0, 1, 0))):
        with Locations((2.3333333333, -31.4652777778)):
            Circle(F16_R_2)
    with BuildSketch(Plane(origin=(0, -36.8, 0), x_dir=(-1, 0, 0), z_dir=(0, 1, 0))):
        with Locations((2.3333333333, -31.4652777778)):
            Circle(F17_R_2)
    with BuildSketch(Plane(origin=(0, -131.9, 0), x_dir=(-1, 0, 0), z_dir=(0, 1, 0))):
        with Locations((2.3333333333, -31.4652777778)):
            Circle(F18_R_2)
    with BuildSketch(Plane(origin=(0, -150.3, 0), x_dir=(-1, 0, 0), z_dir=(0, 1, 0))):
        with Locations((2.3333333333, -31.4652777778)):
            Circle(F19_R_2)
    extrude(amount=-F21_DEPTH)

    # F16 (on face) + F17 (on face) + F18 (on face) + F19 (on face) → F22 (cut)
    with BuildSketch(Plane(origin=(0, -18.4, 0), x_dir=(-1, 0, 0), z_dir=(0, 1, 0))):
        with Locations((2.3333333333, -31.4652777778)):
            Circle(F16_R)
        with Locations((2.3333333333, -31.4652777778)):
            Circle(F16_R_2, mode=Mode.SUBTRACT)
        with Locations((2.3333333333, -31.4652777778)):
            Circle(F16_R_2)
    with BuildSketch(Plane(origin=(0, -36.8, 0), x_dir=(-1, 0, 0), z_dir=(0, 1, 0))):
        with Locations((2.3333333333, -31.4652777778)):
            Circle(F17_R)
        with Locations((2.3333333333, -31.4652777778)):
            Circle(F17_R_2, mode=Mode.SUBTRACT)
        with Locations((2.3333333333, -31.4652777778)):
            Circle(F17_R_2)
    with BuildSketch(Plane(origin=(0, -131.9, 0), x_dir=(-1, 0, 0), z_dir=(0, 1, 0))):
        with Locations((2.3333333333, -31.4652777778)):
            Circle(F18_R)
        with Locations((2.3333333333, -31.4652777778)):
            Circle(F18_R_2, mode=Mode.SUBTRACT)
        with Locations((2.3333333333, -31.4652777778)):
            Circle(F18_R_2)
    with BuildSketch(Plane(origin=(0, -150.3, 0), x_dir=(-1, 0, 0), z_dir=(0, 1, 0))):
        with Locations((2.3333333333, -31.4652777778)):
            Circle(F19_R)
        with Locations((2.3333333333, -31.4652777778)):
            Circle(F19_R_2, mode=Mode.SUBTRACT)
        with Locations((2.3333333333, -31.4652777778)):
            Circle(F19_R_2)
    extrude(amount=-F22_DEPTH, mode=Mode.SUBTRACT)

    # F23 (radius 1 in the source; OpenCascade refuses exactly that, so slightly less here)
    f23_edges = [f1.edges().sort_by_distance(p)[0] for p in [
        (-1.033333, -28.2, -31.465278),
        (-1.033333, -46.6, -31.465278),
        (-1.033333, -141.7, -31.465278),
        (-1.033333, -160.1, -31.465278),
    ]]
    fillet(f23_edges, radius=F23_R)


solid = f1.part
